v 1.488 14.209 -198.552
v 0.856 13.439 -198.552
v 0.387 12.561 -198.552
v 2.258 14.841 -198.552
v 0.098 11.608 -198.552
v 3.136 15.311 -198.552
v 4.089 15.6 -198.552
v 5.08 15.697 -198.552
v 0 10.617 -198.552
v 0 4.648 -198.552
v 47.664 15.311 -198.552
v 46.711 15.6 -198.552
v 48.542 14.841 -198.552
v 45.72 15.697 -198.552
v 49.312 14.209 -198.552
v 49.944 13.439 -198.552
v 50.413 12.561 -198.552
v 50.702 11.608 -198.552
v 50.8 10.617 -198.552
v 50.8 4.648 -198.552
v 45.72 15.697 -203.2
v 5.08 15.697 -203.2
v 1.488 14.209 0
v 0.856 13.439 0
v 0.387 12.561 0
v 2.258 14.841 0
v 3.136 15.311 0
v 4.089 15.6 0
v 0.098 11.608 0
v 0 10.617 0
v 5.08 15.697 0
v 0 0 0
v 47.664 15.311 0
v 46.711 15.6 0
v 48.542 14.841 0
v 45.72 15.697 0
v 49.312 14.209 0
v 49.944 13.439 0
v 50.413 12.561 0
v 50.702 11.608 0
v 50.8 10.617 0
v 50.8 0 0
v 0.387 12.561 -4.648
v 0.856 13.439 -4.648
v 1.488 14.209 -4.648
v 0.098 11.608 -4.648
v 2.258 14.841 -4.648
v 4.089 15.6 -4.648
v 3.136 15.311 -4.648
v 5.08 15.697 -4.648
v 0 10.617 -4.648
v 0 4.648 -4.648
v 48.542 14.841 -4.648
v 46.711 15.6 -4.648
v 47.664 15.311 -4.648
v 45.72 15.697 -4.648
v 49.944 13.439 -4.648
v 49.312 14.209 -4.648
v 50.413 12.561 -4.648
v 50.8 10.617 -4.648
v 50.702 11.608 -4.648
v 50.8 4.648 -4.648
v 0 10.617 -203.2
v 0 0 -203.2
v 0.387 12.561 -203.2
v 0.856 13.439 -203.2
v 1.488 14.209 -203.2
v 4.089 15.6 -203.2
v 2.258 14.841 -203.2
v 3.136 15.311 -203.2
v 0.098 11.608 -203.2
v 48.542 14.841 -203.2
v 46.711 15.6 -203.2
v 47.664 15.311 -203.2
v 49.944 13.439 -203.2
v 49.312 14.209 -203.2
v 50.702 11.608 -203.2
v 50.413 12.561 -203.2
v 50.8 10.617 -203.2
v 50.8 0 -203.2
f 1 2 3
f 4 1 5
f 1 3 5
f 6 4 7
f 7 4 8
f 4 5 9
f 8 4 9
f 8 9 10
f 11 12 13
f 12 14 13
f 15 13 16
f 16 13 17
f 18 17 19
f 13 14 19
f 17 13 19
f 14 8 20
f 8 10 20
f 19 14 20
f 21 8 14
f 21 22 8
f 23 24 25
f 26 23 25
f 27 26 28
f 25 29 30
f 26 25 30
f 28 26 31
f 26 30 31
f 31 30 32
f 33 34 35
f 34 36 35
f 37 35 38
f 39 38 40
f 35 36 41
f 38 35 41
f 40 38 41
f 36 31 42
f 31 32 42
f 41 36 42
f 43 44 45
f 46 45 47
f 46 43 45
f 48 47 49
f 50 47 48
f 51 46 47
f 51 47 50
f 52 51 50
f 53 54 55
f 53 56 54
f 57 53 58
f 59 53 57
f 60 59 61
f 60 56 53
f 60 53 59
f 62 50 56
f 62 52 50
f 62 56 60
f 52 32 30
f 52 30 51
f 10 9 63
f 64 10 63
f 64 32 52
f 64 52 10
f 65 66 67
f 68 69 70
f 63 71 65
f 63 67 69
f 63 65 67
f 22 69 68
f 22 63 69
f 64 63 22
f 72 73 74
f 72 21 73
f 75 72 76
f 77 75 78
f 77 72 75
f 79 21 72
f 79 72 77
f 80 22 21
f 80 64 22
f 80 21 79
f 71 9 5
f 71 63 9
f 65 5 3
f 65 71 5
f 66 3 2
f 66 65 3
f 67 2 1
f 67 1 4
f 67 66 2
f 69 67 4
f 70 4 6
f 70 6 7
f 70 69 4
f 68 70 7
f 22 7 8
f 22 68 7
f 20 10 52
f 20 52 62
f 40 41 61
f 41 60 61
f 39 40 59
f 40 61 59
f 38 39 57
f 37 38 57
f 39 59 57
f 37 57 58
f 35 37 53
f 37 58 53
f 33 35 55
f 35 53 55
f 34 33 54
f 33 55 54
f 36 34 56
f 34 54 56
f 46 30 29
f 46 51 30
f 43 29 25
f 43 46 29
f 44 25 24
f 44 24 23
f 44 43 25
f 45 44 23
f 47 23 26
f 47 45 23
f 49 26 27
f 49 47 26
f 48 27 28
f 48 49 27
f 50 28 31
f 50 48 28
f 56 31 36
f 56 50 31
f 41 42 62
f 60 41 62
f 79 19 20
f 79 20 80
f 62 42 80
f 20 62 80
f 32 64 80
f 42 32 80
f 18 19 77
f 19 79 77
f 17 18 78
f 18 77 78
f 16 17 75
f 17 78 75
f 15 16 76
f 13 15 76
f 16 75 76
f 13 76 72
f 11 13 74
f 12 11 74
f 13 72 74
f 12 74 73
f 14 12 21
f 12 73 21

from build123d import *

# Parameters (mm, degrees)
SKETCH1_W           = 50.8
SKETCH1_H           = 203.2
BOSS_EXTRUDE1_DEPTH = 4.6482
SKETCH2_W           = 50.8
SKETCH2_H           = 4.6482
BOSS_EXTRUDE2_DEPTH = 11.049
FILLET1_R           = 5.08


with BuildPart() as part:
    # Sketch1 → Boss-Extrude1 (new body)
    with BuildSketch(Plane(origin=(0, 0, 0), x_dir=(1, 0, 0), z_dir=(0, 1, 0))):
        with Locations((25.4, 101.6)):
            Rectangle(SKETCH1_W, SKETCH1_H)
    extrude(amount=BOSS_EXTRUDE1_DEPTH)

    # Sketch2 → Boss-Extrude2 (add)
    with BuildSketch(Plane(origin=(0, 4.6482, 0), x_dir=(1, 0, 0), z_dir=(0, 1, 0))):
        with Locations((25.4, 2.3241)):
            Rectangle(SKETCH2_W, SKETCH2_H)
        with Locations((25.4, 200.8759)):
            Rectangle(SKETCH2_W, SKETCH2_H)
    extrude(amount=BOSS_EXTRUDE2_DEPTH)

    # Fillet1
    fillet1_edges = [part.edges().sort_by_distance(p)[0] for p in [
        (0, 15.6972, -2.3241),
        (50.8, 15.6972, -2.3241),
        (0, 15.6972, -200.8759),
        (50.8, 15.6972, -200.8759),
    ]]
    fillet(fillet1_edges, radius=FILLET1_R)


solid = part.part
